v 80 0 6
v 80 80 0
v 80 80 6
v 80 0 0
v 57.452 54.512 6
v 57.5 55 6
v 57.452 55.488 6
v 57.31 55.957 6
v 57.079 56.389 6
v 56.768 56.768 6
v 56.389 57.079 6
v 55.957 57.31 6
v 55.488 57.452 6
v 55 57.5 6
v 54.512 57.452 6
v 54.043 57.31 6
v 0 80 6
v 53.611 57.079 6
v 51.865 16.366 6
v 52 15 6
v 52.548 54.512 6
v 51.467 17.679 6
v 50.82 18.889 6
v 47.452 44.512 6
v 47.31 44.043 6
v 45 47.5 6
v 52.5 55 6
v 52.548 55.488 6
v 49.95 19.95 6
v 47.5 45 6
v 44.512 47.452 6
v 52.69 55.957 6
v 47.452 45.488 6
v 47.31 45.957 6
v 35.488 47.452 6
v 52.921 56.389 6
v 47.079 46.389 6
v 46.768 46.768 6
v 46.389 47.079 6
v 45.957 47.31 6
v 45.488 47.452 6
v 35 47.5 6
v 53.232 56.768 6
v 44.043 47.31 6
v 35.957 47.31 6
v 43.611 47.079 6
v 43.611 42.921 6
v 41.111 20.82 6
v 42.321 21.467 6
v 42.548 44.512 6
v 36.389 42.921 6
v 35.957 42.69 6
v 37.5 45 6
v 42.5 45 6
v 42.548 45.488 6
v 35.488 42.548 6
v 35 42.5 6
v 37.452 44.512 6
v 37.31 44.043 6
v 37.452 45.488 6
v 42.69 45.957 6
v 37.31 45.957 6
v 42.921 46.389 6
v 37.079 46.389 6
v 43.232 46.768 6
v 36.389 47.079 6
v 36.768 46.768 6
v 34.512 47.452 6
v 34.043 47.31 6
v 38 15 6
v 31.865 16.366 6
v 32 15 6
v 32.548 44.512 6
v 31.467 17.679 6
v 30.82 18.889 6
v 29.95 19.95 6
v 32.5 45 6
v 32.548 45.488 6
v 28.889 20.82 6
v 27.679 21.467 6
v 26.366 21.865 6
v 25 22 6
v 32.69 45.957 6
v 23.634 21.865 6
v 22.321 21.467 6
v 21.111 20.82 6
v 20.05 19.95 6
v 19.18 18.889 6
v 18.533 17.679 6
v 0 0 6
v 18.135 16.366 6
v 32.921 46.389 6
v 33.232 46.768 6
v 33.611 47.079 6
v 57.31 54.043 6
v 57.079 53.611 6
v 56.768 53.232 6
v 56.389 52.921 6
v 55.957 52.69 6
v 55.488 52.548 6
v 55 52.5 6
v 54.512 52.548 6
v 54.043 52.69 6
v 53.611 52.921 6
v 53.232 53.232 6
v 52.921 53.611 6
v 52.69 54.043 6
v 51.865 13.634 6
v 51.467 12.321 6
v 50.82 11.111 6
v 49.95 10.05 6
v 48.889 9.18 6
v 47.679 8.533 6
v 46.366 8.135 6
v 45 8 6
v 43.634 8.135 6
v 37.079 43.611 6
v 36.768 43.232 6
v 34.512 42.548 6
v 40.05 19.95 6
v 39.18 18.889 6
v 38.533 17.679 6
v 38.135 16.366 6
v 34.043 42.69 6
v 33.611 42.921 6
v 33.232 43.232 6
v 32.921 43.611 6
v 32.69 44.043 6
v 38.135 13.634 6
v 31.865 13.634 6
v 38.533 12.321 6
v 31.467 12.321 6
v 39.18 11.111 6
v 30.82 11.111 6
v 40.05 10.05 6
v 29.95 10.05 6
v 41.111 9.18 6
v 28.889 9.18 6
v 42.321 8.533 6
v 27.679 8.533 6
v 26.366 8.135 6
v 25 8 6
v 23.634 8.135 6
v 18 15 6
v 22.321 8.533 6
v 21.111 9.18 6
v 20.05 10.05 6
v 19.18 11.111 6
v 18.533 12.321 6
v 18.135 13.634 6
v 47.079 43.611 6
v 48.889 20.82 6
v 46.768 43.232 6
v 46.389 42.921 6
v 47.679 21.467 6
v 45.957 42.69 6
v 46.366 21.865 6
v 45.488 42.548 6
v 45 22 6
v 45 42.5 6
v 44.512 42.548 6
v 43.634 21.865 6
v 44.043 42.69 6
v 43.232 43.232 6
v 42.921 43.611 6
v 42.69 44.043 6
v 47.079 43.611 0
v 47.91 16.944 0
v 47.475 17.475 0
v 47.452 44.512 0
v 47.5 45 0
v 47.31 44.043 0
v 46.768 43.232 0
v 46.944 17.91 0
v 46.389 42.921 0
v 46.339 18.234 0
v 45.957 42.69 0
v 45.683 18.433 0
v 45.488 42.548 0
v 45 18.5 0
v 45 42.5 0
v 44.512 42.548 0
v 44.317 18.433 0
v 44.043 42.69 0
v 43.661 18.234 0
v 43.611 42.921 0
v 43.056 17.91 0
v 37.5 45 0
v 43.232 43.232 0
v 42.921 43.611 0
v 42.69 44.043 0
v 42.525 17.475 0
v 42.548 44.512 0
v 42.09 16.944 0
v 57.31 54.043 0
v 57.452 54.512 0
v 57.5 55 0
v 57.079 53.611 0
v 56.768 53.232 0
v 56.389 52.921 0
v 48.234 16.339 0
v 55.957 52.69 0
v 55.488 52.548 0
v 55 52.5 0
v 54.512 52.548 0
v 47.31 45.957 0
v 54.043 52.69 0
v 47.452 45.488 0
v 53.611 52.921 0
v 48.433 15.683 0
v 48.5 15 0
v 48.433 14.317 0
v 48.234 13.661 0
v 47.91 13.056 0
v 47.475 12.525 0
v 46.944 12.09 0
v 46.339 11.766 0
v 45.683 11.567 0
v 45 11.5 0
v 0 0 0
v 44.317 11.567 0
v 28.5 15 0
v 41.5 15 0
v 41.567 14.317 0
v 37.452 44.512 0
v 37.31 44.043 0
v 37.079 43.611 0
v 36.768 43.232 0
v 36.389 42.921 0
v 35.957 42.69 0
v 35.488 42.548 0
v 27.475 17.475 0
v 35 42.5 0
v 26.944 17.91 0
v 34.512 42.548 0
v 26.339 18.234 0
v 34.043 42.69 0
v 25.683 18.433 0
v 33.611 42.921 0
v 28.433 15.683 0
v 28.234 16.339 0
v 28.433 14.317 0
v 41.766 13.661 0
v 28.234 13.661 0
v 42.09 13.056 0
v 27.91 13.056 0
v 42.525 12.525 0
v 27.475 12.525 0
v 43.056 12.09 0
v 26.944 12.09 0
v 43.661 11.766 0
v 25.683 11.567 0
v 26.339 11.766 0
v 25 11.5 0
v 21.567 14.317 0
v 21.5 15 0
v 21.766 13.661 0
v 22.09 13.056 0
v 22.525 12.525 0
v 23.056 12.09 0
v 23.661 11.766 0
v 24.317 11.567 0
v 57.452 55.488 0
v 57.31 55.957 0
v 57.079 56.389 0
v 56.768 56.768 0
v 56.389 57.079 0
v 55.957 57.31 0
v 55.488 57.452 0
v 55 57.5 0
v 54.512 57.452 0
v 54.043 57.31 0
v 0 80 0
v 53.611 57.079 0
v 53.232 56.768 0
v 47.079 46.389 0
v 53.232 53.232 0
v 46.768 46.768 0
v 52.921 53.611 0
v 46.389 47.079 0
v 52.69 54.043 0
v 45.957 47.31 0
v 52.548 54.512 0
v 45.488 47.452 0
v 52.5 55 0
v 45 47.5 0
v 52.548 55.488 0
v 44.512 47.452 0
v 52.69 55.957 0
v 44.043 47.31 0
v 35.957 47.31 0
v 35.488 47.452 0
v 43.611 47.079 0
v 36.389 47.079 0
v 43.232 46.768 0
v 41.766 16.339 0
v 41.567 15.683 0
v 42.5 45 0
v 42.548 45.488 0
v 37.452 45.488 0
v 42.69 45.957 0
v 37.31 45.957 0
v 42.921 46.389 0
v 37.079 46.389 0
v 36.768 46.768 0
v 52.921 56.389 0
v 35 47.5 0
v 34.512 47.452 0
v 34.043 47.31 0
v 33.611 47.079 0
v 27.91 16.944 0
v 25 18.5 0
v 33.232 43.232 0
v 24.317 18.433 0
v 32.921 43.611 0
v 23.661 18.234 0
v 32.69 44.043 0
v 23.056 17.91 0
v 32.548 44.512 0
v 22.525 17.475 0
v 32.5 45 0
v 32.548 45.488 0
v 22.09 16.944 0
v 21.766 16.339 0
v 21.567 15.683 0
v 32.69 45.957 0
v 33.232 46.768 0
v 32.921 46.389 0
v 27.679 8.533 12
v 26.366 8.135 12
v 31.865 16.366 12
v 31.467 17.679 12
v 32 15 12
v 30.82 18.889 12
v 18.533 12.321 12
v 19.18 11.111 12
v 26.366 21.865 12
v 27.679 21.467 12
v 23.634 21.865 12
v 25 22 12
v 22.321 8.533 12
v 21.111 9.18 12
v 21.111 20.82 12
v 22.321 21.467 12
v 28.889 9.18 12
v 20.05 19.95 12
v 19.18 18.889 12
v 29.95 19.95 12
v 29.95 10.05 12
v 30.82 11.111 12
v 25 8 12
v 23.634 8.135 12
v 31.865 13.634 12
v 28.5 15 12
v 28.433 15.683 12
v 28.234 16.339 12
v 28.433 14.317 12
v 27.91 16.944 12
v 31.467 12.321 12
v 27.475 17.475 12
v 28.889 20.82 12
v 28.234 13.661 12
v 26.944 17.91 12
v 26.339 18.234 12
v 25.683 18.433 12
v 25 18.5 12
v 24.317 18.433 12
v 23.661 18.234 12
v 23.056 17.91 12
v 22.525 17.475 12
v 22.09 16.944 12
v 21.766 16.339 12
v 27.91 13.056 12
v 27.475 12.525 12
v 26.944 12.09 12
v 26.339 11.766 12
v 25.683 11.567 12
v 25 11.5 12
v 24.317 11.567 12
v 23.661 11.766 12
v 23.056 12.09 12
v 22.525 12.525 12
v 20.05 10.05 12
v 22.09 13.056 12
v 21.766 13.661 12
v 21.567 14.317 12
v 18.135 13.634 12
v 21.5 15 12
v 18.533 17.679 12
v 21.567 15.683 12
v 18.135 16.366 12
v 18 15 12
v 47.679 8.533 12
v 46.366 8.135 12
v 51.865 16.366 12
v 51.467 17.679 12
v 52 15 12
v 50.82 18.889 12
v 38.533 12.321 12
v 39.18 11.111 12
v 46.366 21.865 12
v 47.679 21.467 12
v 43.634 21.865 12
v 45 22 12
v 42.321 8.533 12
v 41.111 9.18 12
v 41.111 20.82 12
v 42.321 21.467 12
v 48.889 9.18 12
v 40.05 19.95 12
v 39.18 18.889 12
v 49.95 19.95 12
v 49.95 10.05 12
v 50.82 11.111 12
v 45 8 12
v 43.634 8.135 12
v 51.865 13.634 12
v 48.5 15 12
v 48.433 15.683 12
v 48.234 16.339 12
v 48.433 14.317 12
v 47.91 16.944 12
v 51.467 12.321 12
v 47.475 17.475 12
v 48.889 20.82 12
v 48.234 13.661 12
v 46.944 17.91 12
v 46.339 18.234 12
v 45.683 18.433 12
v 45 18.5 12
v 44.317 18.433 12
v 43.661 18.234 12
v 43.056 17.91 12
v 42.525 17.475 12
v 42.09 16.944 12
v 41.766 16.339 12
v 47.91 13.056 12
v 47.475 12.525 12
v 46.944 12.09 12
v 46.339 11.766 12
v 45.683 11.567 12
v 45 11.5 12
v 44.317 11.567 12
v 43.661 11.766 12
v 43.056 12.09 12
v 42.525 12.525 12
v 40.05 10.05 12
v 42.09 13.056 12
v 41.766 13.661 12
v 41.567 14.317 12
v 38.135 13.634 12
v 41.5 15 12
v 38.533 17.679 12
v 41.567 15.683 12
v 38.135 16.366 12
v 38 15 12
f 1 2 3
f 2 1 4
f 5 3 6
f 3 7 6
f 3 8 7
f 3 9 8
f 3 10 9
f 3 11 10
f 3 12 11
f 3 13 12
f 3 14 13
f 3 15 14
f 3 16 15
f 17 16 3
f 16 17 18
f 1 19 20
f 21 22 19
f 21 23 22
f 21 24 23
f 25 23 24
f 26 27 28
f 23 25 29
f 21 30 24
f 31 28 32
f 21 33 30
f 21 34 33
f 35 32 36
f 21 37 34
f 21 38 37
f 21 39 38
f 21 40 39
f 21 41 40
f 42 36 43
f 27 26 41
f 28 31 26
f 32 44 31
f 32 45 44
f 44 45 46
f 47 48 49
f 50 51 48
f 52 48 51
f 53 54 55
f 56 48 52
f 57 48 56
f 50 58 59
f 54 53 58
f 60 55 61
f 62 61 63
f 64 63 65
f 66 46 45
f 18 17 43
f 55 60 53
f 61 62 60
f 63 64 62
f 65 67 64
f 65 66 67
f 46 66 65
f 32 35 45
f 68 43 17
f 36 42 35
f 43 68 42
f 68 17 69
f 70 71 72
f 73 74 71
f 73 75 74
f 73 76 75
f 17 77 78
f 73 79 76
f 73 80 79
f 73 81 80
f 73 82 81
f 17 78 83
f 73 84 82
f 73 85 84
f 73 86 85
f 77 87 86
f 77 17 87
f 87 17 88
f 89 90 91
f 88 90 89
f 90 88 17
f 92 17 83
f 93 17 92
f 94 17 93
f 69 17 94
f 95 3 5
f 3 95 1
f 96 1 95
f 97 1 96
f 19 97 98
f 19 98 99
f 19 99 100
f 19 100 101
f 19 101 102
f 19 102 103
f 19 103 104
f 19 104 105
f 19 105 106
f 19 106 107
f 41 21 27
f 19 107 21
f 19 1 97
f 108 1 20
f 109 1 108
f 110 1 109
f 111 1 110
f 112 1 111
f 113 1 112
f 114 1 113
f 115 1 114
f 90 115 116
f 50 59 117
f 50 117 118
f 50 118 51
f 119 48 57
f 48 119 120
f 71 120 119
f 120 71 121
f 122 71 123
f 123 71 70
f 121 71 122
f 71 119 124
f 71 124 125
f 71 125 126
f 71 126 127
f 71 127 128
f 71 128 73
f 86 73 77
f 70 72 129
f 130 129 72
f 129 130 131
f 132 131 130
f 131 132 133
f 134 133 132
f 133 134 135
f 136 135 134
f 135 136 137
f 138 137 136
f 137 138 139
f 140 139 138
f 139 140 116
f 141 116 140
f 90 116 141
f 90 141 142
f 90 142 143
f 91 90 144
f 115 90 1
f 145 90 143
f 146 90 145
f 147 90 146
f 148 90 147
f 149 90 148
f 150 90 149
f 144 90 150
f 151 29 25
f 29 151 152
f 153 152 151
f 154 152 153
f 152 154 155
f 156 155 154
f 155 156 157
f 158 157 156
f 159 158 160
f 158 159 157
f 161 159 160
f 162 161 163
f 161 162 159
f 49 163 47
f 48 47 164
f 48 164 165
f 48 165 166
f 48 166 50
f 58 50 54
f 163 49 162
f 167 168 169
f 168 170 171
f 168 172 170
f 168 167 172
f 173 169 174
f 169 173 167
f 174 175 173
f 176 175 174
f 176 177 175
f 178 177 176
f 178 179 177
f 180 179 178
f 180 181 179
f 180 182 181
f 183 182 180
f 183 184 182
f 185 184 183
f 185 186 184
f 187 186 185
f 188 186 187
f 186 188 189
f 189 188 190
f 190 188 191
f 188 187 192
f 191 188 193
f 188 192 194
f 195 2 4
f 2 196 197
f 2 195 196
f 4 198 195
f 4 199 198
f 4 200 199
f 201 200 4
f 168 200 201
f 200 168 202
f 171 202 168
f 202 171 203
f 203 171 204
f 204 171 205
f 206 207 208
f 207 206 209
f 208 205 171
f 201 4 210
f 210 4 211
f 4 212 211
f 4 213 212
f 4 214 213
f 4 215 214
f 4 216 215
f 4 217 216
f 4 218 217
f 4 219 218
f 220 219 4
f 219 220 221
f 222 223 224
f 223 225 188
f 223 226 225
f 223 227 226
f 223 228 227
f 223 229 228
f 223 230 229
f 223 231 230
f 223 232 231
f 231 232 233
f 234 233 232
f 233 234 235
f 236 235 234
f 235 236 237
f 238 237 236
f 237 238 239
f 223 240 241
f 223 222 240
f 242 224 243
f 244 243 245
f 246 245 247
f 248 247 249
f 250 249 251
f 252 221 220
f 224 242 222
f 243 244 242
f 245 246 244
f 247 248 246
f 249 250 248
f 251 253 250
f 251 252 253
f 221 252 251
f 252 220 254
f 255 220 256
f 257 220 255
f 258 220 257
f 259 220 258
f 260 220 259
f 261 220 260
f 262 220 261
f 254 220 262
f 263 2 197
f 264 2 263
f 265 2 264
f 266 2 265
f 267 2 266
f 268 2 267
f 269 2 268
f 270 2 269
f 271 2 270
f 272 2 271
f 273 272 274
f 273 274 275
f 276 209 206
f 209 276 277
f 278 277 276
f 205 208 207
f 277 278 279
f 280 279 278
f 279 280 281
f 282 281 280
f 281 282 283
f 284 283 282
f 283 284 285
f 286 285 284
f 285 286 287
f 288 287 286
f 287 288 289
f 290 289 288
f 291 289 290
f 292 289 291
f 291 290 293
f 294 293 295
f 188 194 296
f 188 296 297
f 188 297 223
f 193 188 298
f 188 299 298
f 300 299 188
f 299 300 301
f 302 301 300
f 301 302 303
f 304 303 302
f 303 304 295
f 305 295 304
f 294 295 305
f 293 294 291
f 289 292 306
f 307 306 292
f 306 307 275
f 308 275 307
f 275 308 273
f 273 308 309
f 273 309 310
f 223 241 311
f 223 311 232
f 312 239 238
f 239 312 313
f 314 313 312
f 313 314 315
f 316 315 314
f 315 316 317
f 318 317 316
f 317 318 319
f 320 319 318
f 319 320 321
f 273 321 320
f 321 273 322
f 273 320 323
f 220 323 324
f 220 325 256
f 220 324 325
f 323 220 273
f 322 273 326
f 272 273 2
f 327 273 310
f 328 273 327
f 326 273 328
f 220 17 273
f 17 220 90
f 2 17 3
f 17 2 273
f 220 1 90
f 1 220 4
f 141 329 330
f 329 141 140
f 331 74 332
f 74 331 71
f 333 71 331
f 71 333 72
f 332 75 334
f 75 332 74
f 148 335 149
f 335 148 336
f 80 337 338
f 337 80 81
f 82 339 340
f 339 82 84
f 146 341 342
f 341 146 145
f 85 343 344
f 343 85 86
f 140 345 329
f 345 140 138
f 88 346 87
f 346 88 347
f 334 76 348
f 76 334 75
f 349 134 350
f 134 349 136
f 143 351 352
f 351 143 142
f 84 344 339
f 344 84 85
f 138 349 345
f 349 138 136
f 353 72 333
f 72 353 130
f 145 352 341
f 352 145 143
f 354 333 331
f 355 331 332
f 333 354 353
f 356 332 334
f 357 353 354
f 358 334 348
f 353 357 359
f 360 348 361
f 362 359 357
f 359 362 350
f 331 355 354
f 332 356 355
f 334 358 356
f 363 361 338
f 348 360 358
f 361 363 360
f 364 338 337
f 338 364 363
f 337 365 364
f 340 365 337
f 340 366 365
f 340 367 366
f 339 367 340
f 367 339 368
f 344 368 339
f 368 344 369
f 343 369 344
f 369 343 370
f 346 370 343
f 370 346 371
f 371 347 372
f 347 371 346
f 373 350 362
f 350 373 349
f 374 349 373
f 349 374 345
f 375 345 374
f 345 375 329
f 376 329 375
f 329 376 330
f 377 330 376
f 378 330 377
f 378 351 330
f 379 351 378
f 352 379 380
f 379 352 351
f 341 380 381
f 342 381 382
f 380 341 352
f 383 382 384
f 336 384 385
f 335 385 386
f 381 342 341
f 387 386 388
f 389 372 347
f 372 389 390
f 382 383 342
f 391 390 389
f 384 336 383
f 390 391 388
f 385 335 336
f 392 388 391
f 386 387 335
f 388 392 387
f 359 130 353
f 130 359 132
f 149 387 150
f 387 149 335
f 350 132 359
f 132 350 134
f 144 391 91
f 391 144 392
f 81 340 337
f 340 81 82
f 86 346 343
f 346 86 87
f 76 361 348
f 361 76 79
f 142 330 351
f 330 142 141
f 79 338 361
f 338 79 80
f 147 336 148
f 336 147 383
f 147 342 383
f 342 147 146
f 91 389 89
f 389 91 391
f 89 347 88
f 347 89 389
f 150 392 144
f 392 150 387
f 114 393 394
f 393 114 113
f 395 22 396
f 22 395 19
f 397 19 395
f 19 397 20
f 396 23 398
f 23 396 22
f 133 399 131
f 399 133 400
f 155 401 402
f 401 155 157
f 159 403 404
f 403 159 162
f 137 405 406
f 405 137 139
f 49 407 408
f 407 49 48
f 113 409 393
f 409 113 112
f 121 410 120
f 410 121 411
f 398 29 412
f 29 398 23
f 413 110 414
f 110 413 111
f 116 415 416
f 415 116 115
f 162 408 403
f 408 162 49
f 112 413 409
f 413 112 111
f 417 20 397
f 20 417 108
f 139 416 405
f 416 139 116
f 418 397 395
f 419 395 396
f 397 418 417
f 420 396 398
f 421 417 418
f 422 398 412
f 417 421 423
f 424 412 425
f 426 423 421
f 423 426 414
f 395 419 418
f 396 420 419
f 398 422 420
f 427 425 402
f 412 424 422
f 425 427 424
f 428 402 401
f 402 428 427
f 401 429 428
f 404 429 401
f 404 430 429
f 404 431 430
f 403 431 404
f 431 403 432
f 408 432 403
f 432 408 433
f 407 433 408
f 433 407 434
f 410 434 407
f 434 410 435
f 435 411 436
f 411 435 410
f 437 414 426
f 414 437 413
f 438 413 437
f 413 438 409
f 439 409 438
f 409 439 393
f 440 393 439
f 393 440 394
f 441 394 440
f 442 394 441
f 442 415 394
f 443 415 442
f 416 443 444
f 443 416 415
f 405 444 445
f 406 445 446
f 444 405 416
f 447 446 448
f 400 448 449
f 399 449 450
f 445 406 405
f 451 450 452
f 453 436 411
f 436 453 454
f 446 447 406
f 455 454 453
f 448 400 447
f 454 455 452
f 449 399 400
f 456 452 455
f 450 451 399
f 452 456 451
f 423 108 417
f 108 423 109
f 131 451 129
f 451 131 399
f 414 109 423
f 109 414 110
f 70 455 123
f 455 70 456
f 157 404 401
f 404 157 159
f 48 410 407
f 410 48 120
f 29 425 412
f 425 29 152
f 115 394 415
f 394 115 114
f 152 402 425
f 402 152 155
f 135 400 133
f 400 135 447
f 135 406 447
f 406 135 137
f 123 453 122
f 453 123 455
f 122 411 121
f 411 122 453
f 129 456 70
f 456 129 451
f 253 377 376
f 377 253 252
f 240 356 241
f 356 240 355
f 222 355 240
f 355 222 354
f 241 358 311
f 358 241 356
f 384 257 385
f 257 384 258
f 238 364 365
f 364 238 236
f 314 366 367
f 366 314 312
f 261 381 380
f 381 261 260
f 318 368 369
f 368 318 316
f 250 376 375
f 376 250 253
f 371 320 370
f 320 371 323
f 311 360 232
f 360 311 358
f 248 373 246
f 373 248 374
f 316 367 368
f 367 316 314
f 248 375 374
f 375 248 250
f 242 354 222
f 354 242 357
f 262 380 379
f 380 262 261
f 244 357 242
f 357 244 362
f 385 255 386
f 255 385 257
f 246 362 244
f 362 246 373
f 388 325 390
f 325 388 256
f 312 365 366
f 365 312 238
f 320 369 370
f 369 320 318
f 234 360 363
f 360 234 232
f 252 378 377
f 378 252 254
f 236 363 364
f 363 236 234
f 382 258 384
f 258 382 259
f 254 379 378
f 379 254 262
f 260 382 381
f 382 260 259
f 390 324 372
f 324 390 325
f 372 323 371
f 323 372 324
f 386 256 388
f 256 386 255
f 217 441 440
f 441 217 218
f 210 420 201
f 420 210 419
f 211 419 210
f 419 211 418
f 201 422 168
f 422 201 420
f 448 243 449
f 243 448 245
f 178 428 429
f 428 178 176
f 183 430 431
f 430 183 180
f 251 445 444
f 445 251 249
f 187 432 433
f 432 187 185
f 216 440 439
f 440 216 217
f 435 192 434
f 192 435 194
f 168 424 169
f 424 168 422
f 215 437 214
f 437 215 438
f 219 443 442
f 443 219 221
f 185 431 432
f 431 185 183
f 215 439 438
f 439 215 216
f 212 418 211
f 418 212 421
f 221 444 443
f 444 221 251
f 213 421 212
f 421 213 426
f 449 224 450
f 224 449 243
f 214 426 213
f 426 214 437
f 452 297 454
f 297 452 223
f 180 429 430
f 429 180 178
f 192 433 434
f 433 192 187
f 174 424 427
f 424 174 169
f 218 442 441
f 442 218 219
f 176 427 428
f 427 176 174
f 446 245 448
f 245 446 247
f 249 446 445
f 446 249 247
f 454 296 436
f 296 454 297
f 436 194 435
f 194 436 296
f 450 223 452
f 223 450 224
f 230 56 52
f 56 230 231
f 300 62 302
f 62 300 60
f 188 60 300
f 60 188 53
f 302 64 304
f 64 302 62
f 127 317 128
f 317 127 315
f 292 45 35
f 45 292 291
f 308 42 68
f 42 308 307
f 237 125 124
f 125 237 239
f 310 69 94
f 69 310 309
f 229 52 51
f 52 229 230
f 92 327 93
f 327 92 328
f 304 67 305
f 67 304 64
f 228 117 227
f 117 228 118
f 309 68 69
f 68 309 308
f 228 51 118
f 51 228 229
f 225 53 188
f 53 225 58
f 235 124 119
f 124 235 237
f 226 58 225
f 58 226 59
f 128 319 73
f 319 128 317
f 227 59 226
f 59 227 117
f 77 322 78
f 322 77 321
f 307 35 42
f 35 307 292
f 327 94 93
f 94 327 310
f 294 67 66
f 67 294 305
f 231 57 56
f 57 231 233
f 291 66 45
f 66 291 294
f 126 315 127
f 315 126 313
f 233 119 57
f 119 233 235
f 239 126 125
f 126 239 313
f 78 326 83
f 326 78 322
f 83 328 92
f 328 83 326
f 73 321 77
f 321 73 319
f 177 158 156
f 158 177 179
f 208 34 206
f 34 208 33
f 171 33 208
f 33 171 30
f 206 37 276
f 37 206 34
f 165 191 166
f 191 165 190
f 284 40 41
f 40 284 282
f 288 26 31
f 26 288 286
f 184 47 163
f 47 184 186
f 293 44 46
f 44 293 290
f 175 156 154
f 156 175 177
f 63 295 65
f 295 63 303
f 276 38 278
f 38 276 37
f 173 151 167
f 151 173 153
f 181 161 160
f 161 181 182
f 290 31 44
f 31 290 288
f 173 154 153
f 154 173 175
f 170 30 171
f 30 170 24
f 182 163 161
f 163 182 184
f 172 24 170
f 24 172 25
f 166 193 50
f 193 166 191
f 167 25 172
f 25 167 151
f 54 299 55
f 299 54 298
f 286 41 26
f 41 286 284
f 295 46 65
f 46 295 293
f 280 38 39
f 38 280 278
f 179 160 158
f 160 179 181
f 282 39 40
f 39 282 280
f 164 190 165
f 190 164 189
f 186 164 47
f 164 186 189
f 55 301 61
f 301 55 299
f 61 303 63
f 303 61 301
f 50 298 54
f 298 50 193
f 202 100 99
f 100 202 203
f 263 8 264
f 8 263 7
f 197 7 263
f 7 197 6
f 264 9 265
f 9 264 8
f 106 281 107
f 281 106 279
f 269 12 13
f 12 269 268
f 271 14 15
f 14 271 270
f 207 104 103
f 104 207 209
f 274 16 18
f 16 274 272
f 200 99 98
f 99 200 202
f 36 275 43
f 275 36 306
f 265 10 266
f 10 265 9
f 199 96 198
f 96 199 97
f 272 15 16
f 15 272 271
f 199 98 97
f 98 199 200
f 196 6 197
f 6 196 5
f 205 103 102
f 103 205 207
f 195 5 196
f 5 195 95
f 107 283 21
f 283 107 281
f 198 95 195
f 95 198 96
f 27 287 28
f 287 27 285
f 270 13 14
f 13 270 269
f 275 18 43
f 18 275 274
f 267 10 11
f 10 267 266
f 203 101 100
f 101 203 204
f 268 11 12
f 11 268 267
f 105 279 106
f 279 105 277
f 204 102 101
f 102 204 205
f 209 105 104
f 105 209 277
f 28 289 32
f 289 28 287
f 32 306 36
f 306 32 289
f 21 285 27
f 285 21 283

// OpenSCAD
$fn = 32;

// ----------------------------------------------------------------------
// Mixed field: bosses and holes at given coordinates
// ----------------------------------------------------------------------

// --- parameters (mm) ---
plate_l = 80;             // plate length, X
plate_w = 80;             // plate width, Y
plate_t = 6;              // plate thickness, Z
boss_d = 14;              // boss diameter
boss_h = 6;               // boss height above the plate
hole_d = 5;               // through hole diameter

total_h = plate_t + boss_h;  // overall height

difference() {
  union() {
    cube([plate_l, plate_w, plate_t]);
    translate([25, 15, plate_t]) cylinder(h = boss_h, d = boss_d);
    translate([45, 15, plate_t]) cylinder(h = boss_h, d = boss_d);
  }
  translate([25, 15, -1]) cylinder(h = total_h + 2, d = boss_d / 2);
  translate([45, 15, -1]) cylinder(h = total_h + 2, d = boss_d / 2);
  translate([35, 45, -1]) cylinder(h = plate_t + 2, d = hole_d);
  translate([45, 45, -1]) cylinder(h = plate_t + 2, d = hole_d);
  translate([55, 55, -1]) cylinder(h = plate_t + 2, d = hole_d);
}
